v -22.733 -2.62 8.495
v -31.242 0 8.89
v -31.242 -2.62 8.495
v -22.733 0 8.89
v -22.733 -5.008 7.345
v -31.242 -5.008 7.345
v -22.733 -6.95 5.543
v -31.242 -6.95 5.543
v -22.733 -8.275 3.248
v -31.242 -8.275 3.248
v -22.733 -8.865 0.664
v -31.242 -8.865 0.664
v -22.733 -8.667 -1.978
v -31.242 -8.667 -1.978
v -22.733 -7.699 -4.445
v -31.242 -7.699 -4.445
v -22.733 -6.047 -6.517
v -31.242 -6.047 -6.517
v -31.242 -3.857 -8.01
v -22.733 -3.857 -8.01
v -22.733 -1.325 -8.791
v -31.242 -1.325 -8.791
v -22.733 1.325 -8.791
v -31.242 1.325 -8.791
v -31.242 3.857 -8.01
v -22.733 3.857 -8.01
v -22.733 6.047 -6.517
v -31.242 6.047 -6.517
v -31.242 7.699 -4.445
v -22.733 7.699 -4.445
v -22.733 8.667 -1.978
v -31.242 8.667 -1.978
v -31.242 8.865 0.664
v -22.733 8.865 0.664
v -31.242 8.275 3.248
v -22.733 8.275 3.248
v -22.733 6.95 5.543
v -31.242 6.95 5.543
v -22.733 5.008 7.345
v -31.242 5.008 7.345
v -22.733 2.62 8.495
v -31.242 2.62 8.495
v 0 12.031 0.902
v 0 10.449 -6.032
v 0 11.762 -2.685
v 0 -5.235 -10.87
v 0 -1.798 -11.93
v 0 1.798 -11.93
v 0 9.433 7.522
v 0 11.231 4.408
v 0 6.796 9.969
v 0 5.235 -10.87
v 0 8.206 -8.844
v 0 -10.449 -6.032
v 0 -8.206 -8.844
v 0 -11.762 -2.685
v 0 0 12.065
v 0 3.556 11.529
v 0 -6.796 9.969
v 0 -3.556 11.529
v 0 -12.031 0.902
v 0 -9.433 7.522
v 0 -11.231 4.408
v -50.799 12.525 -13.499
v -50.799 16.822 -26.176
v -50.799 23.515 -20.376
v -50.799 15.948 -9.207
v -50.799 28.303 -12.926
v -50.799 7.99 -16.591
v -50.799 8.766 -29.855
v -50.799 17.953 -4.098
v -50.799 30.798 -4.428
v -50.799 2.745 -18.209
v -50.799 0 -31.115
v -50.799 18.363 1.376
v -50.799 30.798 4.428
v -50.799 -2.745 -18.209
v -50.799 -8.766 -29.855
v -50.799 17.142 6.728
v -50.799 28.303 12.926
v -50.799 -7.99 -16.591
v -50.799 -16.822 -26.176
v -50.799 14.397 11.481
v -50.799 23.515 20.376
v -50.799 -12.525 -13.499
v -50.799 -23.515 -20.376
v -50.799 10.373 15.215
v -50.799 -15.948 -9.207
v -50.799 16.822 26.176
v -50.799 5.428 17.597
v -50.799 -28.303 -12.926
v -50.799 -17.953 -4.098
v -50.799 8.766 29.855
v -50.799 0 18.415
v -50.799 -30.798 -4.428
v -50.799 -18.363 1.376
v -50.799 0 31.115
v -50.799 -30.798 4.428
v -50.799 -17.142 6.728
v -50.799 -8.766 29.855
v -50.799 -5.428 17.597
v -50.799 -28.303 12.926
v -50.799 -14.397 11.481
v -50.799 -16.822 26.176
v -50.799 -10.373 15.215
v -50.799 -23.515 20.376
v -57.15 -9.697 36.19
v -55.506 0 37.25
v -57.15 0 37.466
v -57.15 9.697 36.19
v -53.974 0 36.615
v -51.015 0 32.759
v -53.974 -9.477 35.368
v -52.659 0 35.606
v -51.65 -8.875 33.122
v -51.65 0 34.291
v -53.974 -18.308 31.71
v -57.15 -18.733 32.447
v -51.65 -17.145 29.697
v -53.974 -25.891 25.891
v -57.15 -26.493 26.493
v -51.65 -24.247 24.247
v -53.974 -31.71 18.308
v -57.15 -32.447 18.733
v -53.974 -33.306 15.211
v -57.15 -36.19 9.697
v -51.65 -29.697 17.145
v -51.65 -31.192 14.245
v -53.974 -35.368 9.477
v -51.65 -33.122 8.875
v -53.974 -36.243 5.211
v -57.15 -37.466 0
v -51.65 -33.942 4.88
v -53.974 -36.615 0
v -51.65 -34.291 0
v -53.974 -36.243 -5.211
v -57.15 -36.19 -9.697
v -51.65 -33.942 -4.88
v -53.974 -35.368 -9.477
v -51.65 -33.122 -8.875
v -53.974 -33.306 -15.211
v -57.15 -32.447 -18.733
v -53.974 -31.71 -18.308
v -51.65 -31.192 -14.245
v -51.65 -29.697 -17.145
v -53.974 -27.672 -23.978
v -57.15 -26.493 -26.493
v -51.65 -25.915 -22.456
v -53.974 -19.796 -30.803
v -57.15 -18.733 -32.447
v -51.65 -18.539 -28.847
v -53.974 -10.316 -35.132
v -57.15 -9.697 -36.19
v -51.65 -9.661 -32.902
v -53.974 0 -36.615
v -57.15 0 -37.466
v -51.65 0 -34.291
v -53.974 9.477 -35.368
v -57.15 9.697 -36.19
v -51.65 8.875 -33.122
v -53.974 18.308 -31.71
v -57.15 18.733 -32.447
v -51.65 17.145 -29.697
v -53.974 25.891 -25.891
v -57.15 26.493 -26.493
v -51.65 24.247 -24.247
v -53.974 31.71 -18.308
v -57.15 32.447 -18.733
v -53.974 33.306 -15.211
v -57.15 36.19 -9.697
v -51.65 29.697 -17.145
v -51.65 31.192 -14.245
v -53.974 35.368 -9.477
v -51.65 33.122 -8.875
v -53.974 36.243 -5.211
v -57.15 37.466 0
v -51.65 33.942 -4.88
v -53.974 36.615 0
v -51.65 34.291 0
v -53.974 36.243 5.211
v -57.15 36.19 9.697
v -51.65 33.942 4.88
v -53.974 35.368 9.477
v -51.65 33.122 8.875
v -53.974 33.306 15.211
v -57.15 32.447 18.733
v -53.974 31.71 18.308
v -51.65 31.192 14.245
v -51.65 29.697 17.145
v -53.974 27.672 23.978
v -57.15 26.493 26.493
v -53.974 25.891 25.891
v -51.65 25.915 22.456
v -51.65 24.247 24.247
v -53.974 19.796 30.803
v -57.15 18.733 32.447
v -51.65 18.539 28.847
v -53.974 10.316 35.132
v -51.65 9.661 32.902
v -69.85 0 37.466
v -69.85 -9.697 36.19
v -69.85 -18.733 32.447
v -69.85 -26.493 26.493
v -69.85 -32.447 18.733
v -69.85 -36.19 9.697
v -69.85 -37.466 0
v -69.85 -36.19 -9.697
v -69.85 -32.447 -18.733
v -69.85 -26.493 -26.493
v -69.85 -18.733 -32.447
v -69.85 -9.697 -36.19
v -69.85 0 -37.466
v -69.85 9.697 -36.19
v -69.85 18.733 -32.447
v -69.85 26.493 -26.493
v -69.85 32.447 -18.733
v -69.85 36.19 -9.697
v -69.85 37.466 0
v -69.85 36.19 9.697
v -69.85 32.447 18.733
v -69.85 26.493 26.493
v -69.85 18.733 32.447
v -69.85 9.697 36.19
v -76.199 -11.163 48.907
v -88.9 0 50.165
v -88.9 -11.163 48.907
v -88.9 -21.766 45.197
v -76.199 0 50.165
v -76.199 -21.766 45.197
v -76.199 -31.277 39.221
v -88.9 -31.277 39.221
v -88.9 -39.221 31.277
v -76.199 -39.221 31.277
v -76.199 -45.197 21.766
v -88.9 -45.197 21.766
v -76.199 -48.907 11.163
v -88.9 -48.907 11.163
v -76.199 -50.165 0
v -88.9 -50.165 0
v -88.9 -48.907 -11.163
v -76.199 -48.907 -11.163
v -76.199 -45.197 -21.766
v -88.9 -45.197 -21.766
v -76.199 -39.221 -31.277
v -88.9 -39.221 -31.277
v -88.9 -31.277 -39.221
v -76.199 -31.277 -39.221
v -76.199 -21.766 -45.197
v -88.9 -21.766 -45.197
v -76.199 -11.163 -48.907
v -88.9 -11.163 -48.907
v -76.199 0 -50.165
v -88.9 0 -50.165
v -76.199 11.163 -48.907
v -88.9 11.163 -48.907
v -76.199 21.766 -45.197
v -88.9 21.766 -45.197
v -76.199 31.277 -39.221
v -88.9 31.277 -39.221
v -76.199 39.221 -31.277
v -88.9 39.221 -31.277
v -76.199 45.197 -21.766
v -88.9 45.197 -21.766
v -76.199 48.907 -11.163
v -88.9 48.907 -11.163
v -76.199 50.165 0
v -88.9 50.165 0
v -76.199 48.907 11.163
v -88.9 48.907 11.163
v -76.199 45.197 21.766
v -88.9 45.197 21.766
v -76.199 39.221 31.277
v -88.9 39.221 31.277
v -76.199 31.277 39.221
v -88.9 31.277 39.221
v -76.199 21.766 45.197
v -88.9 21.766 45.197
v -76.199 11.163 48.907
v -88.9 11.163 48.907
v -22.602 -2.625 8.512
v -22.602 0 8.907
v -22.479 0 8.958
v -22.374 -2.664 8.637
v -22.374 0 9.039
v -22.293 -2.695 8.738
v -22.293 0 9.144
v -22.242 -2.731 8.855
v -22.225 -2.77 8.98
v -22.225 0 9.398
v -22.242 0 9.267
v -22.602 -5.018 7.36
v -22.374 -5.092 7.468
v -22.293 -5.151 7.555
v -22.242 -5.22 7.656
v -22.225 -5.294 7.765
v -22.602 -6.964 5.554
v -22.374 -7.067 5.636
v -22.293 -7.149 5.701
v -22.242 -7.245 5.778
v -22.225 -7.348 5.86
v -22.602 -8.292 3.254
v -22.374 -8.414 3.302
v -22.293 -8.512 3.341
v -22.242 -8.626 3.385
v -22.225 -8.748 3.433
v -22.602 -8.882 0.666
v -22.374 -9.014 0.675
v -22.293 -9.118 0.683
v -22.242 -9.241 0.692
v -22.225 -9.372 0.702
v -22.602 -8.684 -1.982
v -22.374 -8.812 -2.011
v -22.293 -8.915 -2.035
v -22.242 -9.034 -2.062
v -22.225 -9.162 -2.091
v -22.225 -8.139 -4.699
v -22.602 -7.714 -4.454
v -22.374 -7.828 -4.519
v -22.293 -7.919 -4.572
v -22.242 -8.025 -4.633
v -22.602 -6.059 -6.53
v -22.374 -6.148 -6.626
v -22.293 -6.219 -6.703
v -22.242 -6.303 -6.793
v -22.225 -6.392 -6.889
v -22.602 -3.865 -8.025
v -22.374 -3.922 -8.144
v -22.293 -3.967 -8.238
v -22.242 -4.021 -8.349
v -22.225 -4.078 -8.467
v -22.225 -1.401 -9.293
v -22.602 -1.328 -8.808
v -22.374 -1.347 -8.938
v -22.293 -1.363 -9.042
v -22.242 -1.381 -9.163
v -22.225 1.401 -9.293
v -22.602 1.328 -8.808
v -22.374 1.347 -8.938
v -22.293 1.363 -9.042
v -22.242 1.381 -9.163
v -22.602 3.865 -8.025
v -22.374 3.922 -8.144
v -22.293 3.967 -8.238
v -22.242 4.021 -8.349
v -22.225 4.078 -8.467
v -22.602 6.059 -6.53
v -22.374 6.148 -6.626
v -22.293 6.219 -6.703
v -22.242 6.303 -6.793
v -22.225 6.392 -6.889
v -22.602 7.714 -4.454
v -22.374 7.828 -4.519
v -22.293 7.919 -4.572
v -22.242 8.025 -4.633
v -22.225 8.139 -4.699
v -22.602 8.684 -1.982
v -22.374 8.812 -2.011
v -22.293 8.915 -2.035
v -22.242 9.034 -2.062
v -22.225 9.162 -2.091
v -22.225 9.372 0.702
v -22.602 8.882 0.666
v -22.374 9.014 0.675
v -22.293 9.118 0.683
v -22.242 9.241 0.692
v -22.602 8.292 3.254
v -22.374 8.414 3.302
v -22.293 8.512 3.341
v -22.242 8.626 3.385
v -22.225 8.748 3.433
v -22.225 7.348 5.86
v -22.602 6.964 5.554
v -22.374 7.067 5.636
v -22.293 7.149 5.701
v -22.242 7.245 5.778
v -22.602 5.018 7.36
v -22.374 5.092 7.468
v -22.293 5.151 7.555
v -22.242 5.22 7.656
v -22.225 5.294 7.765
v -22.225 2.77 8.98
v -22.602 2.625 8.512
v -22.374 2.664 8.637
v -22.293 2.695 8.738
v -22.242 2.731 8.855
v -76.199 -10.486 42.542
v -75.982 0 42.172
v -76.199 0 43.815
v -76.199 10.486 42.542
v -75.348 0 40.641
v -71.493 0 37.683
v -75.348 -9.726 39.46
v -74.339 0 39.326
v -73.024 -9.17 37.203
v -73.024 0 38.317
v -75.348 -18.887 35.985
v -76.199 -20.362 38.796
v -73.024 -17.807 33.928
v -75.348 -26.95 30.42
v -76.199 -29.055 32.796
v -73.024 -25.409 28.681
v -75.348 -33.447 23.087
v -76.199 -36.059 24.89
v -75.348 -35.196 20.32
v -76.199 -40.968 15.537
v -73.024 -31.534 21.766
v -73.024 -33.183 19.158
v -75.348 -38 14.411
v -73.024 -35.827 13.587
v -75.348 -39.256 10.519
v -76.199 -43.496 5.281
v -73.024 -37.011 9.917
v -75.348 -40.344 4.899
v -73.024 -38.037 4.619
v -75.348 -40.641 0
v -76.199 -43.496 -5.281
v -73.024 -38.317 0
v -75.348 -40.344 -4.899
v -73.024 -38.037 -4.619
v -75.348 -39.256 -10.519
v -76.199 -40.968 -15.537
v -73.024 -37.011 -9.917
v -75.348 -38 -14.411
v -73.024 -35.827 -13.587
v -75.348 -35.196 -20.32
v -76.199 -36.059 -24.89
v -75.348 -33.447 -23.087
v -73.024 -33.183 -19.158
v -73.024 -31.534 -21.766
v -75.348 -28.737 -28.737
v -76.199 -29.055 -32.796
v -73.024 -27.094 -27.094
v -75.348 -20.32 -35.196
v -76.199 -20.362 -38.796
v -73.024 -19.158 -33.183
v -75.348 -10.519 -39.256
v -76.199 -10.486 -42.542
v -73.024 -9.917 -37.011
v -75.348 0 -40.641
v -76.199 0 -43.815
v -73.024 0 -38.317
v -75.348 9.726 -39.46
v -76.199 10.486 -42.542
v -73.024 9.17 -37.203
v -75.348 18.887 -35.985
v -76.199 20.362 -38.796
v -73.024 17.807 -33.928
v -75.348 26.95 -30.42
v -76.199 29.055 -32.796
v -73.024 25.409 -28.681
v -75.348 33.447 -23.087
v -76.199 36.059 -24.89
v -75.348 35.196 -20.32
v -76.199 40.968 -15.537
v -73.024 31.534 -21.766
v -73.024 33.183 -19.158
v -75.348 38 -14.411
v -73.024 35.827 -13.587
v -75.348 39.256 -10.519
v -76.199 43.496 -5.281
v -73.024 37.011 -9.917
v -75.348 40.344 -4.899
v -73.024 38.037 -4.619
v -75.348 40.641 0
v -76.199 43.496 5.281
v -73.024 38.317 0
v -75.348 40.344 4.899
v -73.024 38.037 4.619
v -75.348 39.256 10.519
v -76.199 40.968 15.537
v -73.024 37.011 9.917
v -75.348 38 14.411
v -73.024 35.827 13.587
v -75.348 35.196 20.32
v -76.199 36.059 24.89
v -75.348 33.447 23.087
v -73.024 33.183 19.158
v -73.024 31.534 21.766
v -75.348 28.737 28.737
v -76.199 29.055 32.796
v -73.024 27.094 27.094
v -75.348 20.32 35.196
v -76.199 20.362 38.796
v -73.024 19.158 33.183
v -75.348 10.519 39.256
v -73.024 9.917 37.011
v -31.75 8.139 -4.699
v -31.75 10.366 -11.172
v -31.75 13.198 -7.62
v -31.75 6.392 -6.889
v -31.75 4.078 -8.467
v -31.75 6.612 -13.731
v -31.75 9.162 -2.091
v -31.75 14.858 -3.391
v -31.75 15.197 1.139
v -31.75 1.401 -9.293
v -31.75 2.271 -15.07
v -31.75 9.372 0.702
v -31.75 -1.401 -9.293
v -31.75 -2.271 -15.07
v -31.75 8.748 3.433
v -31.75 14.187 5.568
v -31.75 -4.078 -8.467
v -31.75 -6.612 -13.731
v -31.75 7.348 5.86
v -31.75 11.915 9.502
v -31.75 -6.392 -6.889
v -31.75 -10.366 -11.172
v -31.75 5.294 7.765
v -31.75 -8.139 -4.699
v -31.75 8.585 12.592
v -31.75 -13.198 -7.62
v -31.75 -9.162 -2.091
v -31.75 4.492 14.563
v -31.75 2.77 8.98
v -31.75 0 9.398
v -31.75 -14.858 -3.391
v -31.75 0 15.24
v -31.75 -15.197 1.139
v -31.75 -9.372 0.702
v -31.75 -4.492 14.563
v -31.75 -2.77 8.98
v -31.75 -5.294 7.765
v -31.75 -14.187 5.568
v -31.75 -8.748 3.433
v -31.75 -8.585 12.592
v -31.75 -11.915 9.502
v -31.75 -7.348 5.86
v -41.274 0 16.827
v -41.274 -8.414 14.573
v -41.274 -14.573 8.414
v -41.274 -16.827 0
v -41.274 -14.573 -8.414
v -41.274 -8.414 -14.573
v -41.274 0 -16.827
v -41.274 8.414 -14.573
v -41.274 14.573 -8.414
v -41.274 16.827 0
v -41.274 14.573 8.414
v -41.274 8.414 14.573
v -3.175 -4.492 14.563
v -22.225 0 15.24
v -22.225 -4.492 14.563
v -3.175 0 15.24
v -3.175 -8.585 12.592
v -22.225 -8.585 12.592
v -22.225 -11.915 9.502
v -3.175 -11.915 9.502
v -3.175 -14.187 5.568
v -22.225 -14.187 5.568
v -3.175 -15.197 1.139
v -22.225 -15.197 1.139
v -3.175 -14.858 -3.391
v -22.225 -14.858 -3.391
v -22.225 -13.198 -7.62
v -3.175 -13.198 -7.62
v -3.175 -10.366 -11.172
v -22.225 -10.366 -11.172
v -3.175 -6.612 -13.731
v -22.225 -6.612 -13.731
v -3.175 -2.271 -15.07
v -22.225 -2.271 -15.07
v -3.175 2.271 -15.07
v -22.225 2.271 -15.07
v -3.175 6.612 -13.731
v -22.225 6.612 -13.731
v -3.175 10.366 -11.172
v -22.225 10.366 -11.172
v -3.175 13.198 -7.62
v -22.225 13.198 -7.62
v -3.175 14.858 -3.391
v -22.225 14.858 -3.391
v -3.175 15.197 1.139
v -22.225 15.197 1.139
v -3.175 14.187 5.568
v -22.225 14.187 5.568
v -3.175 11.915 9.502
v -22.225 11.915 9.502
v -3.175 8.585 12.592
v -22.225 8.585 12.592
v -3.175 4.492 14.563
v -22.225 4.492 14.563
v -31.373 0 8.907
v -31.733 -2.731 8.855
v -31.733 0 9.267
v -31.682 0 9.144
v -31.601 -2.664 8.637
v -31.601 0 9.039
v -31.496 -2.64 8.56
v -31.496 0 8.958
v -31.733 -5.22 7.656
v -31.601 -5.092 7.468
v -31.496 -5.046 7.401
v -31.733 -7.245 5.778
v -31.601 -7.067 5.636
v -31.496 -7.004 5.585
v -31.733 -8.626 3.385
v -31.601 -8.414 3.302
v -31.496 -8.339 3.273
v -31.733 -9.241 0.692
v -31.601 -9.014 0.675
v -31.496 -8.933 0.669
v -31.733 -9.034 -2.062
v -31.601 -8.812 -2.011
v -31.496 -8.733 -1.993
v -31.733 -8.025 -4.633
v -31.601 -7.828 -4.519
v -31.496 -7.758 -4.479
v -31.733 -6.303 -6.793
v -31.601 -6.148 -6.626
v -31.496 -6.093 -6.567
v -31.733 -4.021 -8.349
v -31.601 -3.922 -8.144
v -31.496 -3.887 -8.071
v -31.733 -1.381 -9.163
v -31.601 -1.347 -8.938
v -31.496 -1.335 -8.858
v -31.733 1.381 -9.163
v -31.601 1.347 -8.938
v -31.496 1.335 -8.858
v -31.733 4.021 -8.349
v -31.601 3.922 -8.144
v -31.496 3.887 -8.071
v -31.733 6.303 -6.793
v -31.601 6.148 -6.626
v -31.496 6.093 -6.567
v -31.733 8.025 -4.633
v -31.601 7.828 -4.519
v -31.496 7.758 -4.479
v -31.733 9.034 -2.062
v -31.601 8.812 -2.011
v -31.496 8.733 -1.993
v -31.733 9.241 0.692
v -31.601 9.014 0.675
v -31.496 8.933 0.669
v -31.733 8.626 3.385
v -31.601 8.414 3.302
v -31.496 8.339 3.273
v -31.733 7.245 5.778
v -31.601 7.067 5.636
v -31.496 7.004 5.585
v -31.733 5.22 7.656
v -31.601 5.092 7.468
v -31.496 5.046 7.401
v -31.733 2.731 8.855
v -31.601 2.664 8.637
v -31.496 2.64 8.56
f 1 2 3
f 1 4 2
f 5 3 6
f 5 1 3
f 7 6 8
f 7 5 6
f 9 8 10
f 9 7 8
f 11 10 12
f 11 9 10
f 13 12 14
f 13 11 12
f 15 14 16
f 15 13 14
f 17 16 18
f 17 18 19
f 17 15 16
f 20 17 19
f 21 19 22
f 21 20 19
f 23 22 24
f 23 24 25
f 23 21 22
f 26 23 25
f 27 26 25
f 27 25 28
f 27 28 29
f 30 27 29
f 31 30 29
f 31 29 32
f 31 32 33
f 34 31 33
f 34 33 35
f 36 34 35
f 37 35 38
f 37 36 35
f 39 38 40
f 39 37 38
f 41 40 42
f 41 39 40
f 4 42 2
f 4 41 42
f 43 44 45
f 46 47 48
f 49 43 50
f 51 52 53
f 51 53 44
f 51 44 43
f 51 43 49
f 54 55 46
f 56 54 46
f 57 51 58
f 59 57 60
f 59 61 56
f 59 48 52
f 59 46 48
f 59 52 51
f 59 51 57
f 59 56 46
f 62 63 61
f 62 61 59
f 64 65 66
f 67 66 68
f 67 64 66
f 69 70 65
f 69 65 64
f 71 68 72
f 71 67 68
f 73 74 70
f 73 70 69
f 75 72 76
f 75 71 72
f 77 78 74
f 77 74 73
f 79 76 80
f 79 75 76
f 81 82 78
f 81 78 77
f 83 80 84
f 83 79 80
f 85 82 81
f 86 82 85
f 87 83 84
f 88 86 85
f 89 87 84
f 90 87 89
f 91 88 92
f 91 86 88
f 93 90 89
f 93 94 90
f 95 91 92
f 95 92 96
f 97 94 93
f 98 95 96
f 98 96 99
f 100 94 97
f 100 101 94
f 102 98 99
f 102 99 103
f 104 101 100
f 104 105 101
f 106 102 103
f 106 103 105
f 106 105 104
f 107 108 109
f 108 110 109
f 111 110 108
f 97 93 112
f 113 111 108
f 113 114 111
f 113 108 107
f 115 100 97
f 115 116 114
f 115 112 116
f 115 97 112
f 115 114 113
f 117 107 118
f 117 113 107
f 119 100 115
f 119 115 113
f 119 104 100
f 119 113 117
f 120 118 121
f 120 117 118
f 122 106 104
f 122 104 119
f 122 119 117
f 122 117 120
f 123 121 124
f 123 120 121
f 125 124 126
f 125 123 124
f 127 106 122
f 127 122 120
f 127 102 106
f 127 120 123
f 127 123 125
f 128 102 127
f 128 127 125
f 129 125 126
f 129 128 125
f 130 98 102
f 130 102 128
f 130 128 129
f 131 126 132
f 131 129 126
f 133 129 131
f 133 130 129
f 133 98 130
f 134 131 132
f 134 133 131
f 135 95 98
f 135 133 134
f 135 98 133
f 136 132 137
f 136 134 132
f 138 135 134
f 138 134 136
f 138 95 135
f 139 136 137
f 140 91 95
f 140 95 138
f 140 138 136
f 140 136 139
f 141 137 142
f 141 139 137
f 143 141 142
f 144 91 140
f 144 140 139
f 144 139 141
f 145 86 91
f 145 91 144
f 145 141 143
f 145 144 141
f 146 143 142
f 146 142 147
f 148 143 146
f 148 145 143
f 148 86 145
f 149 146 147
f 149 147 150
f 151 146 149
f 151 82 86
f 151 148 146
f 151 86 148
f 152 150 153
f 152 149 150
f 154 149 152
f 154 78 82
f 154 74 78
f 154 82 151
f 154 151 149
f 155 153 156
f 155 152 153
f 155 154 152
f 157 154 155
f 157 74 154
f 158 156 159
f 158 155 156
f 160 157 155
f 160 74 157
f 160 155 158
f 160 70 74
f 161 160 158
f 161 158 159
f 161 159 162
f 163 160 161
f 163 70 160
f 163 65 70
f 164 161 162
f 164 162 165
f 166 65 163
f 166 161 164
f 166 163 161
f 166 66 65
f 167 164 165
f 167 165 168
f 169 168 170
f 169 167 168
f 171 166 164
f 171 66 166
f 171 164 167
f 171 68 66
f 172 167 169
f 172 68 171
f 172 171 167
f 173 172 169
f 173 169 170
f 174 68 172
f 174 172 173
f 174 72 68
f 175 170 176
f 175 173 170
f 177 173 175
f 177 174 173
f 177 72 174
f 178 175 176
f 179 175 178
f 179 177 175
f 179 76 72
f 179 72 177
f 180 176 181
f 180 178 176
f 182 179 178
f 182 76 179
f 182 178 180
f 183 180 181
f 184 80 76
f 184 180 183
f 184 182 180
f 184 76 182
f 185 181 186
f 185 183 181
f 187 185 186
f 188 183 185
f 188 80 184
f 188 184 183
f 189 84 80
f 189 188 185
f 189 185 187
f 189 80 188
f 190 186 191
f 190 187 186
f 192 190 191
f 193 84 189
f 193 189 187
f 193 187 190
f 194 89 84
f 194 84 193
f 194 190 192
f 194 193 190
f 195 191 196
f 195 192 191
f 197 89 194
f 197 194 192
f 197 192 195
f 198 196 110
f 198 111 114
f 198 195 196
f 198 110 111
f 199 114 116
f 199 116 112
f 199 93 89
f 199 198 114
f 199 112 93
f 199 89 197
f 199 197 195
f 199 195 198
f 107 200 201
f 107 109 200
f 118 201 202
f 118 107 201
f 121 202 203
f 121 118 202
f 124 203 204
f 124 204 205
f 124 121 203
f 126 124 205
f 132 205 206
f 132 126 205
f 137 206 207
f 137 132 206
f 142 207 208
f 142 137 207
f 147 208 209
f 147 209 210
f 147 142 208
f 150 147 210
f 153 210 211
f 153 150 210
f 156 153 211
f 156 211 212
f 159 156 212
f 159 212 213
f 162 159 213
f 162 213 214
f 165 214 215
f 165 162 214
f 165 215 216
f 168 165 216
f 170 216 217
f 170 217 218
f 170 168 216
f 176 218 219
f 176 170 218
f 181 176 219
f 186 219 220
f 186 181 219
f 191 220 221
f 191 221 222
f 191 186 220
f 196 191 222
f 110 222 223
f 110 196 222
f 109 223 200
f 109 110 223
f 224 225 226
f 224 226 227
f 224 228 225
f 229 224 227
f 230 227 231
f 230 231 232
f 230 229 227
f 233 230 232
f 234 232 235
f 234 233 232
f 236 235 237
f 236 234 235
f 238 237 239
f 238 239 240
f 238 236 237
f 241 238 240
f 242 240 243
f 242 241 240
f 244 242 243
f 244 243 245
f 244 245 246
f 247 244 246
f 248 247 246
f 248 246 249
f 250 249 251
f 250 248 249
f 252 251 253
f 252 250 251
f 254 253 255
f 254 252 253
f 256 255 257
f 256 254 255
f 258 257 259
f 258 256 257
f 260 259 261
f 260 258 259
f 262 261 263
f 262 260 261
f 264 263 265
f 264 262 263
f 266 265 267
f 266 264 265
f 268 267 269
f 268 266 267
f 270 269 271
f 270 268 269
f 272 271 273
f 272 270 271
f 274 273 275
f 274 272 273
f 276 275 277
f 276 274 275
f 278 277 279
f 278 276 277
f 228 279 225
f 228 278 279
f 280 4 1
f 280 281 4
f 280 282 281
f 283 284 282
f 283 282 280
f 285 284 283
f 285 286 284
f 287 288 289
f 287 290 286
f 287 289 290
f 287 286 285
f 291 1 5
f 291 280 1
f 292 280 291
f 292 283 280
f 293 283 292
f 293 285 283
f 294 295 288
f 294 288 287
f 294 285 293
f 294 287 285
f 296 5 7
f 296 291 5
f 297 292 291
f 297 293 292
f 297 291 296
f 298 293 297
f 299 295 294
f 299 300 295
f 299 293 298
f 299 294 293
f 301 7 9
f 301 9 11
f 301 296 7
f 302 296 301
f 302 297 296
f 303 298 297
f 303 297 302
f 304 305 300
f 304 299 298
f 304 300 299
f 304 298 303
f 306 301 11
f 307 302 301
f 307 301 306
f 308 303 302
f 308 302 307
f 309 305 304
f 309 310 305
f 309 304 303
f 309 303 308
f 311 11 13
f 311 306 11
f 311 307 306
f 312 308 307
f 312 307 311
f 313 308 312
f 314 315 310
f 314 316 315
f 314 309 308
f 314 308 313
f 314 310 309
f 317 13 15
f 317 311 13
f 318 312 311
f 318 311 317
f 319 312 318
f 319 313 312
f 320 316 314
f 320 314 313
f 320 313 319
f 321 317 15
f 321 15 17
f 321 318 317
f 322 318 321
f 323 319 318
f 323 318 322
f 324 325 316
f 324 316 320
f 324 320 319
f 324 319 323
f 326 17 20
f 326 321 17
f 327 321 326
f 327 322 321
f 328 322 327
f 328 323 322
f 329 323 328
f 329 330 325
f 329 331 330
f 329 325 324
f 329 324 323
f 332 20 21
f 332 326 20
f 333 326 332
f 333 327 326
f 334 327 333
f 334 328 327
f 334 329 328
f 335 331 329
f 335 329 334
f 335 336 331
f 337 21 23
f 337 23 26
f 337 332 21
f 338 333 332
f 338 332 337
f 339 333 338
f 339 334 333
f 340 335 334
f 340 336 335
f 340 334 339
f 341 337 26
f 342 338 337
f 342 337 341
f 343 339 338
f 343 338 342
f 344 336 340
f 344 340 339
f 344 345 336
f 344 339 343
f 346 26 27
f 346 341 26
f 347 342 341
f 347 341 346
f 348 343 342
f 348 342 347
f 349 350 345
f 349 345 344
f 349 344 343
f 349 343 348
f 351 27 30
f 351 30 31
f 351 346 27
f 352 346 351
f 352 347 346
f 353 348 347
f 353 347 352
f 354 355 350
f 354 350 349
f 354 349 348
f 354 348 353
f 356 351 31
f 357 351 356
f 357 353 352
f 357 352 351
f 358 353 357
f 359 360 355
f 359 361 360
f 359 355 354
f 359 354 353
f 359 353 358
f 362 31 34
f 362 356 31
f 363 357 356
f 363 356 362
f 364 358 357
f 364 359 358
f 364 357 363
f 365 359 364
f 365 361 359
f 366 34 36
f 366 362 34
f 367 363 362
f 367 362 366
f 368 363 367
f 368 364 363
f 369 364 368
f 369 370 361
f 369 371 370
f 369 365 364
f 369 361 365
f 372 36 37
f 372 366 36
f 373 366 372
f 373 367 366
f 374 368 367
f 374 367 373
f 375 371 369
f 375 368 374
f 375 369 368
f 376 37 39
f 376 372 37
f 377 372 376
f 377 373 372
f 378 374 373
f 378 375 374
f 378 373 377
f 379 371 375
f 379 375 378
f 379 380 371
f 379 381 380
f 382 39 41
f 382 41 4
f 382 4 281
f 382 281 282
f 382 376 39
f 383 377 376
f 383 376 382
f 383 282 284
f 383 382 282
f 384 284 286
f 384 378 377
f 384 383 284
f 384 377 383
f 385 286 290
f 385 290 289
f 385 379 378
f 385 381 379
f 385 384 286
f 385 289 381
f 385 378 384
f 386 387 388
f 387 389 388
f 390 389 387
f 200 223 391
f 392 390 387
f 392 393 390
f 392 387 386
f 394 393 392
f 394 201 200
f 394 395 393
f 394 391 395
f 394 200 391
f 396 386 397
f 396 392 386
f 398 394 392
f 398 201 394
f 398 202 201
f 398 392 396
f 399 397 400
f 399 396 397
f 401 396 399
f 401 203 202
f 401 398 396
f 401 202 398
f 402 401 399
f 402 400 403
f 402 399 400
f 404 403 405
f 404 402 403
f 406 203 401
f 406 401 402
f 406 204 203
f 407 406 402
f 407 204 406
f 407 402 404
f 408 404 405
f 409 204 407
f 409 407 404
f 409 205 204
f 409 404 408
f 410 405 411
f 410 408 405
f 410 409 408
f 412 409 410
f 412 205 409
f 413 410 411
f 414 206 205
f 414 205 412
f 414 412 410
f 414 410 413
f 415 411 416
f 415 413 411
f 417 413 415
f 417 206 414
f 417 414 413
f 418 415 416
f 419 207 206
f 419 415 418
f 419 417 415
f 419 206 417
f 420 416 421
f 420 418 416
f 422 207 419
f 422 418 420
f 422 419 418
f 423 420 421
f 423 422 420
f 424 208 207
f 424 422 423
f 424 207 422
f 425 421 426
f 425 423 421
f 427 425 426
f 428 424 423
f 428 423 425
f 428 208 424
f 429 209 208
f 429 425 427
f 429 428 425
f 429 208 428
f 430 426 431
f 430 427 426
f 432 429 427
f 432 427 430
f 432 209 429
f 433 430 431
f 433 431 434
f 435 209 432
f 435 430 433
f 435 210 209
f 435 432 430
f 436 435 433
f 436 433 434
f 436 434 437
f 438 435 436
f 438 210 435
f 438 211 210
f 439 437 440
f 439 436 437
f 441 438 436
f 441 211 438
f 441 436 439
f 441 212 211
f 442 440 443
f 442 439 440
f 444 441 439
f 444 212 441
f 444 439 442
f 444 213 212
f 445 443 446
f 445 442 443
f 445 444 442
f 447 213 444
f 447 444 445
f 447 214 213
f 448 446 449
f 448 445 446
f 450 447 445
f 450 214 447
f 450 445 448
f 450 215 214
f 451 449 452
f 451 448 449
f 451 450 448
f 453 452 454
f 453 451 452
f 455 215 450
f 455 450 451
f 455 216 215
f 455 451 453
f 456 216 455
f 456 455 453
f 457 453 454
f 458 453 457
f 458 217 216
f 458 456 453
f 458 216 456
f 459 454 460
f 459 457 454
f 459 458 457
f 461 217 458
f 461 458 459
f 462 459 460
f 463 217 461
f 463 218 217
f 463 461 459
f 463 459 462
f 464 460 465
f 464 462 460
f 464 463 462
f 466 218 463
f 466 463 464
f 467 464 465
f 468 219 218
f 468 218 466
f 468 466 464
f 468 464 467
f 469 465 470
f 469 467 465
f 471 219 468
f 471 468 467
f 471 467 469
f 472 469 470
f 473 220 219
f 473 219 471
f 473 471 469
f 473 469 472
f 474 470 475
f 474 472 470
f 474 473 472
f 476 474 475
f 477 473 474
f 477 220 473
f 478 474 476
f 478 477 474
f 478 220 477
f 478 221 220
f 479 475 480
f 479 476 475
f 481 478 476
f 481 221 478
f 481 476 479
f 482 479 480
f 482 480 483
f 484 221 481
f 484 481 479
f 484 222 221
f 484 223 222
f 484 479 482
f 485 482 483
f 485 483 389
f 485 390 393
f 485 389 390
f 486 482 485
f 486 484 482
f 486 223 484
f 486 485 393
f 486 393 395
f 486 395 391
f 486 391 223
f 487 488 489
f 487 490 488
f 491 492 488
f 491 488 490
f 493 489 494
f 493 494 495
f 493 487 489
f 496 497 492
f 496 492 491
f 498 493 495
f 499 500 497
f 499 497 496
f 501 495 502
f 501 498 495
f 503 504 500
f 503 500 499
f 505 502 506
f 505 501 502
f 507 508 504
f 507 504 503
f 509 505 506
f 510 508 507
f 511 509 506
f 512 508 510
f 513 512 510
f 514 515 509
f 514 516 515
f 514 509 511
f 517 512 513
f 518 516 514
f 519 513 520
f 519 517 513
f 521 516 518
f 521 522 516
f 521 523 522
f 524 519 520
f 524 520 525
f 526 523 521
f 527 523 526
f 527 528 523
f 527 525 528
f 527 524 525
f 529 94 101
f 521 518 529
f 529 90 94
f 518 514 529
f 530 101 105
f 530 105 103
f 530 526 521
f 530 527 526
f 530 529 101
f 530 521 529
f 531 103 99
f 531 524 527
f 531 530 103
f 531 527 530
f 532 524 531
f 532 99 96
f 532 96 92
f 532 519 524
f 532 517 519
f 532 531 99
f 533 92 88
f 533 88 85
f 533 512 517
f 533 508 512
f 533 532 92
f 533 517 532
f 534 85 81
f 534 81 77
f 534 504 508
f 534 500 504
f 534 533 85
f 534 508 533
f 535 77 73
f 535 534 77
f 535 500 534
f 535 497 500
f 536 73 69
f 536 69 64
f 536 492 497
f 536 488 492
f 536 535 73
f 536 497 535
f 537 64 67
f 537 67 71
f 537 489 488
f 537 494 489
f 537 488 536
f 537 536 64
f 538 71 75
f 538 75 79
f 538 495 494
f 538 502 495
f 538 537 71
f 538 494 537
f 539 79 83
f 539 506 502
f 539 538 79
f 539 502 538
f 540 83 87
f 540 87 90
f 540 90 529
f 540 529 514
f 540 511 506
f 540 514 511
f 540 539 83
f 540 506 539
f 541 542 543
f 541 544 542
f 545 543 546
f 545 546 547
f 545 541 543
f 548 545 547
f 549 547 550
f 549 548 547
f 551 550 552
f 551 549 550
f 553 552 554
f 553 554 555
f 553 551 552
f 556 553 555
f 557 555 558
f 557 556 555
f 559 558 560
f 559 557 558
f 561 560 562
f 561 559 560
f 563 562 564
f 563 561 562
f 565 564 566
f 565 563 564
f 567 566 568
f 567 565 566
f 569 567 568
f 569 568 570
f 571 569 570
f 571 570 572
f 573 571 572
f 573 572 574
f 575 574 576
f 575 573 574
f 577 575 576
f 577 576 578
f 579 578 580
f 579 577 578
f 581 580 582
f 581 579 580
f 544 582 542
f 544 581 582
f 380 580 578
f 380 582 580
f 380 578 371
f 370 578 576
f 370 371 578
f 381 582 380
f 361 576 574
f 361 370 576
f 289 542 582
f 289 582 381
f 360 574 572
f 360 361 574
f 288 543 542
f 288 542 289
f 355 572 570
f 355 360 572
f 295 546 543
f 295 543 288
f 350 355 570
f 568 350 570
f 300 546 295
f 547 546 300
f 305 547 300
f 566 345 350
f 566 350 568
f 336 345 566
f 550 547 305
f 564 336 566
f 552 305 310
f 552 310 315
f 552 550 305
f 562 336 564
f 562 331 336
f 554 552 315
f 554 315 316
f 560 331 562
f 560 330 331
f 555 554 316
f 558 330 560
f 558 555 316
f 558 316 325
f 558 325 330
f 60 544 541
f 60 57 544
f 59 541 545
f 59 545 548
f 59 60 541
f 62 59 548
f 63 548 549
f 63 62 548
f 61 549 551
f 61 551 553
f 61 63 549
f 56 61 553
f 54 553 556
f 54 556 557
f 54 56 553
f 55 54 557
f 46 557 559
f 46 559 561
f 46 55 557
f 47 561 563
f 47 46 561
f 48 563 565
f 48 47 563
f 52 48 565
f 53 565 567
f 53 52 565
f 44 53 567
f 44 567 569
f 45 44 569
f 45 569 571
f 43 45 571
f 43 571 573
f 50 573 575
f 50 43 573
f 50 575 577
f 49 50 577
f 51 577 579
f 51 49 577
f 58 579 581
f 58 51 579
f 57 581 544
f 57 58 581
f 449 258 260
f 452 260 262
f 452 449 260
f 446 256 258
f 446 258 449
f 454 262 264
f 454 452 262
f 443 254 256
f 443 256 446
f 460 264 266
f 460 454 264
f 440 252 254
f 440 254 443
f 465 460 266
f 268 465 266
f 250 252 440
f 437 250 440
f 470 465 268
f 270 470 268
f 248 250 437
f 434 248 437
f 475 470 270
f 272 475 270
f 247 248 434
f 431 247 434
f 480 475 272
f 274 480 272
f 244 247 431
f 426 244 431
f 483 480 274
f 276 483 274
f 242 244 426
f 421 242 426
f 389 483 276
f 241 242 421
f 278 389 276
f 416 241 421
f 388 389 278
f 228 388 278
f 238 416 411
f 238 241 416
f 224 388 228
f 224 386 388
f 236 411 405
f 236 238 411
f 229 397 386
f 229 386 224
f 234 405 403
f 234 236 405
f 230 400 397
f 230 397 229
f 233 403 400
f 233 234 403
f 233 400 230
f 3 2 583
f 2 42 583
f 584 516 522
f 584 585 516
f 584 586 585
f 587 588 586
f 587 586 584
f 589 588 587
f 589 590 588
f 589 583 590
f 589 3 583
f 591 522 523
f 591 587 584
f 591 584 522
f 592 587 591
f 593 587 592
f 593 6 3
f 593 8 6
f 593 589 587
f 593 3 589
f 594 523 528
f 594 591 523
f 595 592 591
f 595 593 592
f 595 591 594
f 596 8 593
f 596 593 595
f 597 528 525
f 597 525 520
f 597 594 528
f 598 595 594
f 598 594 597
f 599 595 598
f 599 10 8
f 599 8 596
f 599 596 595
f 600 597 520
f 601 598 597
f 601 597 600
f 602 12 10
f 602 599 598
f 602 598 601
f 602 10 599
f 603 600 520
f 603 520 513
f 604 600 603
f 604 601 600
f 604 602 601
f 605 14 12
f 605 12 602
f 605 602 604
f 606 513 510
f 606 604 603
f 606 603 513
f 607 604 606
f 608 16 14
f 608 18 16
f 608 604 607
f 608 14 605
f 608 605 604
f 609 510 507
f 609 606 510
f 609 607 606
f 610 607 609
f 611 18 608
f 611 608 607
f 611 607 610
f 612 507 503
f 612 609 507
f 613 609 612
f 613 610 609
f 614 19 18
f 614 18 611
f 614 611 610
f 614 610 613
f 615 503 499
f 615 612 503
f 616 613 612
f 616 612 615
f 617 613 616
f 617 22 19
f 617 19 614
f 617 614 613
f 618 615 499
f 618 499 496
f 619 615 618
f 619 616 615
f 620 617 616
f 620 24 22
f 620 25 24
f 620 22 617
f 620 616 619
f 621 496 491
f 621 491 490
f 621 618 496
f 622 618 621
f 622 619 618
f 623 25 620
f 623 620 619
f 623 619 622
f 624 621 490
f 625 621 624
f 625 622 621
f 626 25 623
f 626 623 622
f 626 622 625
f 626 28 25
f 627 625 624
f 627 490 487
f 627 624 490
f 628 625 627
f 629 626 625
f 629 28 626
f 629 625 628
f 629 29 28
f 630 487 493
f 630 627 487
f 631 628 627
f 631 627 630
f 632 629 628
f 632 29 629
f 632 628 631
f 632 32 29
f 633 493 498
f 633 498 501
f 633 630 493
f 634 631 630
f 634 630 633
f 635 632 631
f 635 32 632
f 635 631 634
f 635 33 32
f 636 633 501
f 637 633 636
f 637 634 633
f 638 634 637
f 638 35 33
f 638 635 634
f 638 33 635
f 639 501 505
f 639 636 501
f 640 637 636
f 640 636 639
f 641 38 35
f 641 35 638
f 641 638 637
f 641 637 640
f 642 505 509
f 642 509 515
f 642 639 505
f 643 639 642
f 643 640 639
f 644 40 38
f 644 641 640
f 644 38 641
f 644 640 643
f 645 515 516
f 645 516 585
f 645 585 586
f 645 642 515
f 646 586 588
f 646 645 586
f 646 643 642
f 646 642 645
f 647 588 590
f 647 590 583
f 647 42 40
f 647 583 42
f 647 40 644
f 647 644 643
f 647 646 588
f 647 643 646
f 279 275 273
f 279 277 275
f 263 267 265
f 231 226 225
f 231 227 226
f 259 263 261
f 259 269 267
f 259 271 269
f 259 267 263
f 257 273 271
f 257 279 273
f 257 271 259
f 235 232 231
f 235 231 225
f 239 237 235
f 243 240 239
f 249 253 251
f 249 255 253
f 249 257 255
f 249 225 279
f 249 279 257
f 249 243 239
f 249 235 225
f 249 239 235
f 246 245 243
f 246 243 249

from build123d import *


with BuildPart() as part:
    # Sketch1 → Base-Revolve (revolve)
    with BuildSketch(Plane.XY, mode=Mode.PRIVATE) as base_revolve_sk:
        with BuildLine():
            Line((-88.899984186, 50.165), (-76.198738953, 50.165))
            Line((-76.198738953, 50.165), (-76.198738953, 43.815))
            ThreePointArc((-76.198738953, 43.815), (-74.339229418, 39.325746861), (-69.849976278, 37.466237326))
            Line((-69.849976278, 37.466237326), (-57.15, 37.466237326))
            ThreePointArc((-57.15, 37.466237326), (-52.658991427, 35.606000666), (-50.798754767, 31.114992093))
            Line((-50.798754767, 31.114992093), (-50.798754767, 18.414784554))
            Line((-50.798754767, 18.414784554), (-31.75, 15.239992093))
            Line((-31.75, 15.239992093), (-31.75, 9.397992093))
            ThreePointArc((-31.75, 9.397992093), (-31.601210245, 9.038781848), (-31.242, 8.889992093))
            Line((-31.242, 8.889992093), (-22.733, 8.889992093))
            ThreePointArc((-22.733, 8.889992093), (-22.373789755, 9.038781848), (-22.225, 9.397992093))
            Line((-22.225, 9.397992093), (-22.225, 15.239992093))
            Line((-22.225, 15.239992093), (-3.175, 15.239992093))
            Line((-3.175, 15.239992093), (0, 12.064992093))
            Line((0, 12.064992093), (0, 0))
            Line((0, 0), (-88.899984186, 0))
            Line((-88.899984186, 0), (-88.899984186, 50.165))
        make_face()
    revolve(base_revolve_sk.sketch.rotate(Axis((0, 0, 0), (1, 0, 0)), 90), axis=Axis((0, 0, 0), (1, 0, 0)))


solid = part.part
